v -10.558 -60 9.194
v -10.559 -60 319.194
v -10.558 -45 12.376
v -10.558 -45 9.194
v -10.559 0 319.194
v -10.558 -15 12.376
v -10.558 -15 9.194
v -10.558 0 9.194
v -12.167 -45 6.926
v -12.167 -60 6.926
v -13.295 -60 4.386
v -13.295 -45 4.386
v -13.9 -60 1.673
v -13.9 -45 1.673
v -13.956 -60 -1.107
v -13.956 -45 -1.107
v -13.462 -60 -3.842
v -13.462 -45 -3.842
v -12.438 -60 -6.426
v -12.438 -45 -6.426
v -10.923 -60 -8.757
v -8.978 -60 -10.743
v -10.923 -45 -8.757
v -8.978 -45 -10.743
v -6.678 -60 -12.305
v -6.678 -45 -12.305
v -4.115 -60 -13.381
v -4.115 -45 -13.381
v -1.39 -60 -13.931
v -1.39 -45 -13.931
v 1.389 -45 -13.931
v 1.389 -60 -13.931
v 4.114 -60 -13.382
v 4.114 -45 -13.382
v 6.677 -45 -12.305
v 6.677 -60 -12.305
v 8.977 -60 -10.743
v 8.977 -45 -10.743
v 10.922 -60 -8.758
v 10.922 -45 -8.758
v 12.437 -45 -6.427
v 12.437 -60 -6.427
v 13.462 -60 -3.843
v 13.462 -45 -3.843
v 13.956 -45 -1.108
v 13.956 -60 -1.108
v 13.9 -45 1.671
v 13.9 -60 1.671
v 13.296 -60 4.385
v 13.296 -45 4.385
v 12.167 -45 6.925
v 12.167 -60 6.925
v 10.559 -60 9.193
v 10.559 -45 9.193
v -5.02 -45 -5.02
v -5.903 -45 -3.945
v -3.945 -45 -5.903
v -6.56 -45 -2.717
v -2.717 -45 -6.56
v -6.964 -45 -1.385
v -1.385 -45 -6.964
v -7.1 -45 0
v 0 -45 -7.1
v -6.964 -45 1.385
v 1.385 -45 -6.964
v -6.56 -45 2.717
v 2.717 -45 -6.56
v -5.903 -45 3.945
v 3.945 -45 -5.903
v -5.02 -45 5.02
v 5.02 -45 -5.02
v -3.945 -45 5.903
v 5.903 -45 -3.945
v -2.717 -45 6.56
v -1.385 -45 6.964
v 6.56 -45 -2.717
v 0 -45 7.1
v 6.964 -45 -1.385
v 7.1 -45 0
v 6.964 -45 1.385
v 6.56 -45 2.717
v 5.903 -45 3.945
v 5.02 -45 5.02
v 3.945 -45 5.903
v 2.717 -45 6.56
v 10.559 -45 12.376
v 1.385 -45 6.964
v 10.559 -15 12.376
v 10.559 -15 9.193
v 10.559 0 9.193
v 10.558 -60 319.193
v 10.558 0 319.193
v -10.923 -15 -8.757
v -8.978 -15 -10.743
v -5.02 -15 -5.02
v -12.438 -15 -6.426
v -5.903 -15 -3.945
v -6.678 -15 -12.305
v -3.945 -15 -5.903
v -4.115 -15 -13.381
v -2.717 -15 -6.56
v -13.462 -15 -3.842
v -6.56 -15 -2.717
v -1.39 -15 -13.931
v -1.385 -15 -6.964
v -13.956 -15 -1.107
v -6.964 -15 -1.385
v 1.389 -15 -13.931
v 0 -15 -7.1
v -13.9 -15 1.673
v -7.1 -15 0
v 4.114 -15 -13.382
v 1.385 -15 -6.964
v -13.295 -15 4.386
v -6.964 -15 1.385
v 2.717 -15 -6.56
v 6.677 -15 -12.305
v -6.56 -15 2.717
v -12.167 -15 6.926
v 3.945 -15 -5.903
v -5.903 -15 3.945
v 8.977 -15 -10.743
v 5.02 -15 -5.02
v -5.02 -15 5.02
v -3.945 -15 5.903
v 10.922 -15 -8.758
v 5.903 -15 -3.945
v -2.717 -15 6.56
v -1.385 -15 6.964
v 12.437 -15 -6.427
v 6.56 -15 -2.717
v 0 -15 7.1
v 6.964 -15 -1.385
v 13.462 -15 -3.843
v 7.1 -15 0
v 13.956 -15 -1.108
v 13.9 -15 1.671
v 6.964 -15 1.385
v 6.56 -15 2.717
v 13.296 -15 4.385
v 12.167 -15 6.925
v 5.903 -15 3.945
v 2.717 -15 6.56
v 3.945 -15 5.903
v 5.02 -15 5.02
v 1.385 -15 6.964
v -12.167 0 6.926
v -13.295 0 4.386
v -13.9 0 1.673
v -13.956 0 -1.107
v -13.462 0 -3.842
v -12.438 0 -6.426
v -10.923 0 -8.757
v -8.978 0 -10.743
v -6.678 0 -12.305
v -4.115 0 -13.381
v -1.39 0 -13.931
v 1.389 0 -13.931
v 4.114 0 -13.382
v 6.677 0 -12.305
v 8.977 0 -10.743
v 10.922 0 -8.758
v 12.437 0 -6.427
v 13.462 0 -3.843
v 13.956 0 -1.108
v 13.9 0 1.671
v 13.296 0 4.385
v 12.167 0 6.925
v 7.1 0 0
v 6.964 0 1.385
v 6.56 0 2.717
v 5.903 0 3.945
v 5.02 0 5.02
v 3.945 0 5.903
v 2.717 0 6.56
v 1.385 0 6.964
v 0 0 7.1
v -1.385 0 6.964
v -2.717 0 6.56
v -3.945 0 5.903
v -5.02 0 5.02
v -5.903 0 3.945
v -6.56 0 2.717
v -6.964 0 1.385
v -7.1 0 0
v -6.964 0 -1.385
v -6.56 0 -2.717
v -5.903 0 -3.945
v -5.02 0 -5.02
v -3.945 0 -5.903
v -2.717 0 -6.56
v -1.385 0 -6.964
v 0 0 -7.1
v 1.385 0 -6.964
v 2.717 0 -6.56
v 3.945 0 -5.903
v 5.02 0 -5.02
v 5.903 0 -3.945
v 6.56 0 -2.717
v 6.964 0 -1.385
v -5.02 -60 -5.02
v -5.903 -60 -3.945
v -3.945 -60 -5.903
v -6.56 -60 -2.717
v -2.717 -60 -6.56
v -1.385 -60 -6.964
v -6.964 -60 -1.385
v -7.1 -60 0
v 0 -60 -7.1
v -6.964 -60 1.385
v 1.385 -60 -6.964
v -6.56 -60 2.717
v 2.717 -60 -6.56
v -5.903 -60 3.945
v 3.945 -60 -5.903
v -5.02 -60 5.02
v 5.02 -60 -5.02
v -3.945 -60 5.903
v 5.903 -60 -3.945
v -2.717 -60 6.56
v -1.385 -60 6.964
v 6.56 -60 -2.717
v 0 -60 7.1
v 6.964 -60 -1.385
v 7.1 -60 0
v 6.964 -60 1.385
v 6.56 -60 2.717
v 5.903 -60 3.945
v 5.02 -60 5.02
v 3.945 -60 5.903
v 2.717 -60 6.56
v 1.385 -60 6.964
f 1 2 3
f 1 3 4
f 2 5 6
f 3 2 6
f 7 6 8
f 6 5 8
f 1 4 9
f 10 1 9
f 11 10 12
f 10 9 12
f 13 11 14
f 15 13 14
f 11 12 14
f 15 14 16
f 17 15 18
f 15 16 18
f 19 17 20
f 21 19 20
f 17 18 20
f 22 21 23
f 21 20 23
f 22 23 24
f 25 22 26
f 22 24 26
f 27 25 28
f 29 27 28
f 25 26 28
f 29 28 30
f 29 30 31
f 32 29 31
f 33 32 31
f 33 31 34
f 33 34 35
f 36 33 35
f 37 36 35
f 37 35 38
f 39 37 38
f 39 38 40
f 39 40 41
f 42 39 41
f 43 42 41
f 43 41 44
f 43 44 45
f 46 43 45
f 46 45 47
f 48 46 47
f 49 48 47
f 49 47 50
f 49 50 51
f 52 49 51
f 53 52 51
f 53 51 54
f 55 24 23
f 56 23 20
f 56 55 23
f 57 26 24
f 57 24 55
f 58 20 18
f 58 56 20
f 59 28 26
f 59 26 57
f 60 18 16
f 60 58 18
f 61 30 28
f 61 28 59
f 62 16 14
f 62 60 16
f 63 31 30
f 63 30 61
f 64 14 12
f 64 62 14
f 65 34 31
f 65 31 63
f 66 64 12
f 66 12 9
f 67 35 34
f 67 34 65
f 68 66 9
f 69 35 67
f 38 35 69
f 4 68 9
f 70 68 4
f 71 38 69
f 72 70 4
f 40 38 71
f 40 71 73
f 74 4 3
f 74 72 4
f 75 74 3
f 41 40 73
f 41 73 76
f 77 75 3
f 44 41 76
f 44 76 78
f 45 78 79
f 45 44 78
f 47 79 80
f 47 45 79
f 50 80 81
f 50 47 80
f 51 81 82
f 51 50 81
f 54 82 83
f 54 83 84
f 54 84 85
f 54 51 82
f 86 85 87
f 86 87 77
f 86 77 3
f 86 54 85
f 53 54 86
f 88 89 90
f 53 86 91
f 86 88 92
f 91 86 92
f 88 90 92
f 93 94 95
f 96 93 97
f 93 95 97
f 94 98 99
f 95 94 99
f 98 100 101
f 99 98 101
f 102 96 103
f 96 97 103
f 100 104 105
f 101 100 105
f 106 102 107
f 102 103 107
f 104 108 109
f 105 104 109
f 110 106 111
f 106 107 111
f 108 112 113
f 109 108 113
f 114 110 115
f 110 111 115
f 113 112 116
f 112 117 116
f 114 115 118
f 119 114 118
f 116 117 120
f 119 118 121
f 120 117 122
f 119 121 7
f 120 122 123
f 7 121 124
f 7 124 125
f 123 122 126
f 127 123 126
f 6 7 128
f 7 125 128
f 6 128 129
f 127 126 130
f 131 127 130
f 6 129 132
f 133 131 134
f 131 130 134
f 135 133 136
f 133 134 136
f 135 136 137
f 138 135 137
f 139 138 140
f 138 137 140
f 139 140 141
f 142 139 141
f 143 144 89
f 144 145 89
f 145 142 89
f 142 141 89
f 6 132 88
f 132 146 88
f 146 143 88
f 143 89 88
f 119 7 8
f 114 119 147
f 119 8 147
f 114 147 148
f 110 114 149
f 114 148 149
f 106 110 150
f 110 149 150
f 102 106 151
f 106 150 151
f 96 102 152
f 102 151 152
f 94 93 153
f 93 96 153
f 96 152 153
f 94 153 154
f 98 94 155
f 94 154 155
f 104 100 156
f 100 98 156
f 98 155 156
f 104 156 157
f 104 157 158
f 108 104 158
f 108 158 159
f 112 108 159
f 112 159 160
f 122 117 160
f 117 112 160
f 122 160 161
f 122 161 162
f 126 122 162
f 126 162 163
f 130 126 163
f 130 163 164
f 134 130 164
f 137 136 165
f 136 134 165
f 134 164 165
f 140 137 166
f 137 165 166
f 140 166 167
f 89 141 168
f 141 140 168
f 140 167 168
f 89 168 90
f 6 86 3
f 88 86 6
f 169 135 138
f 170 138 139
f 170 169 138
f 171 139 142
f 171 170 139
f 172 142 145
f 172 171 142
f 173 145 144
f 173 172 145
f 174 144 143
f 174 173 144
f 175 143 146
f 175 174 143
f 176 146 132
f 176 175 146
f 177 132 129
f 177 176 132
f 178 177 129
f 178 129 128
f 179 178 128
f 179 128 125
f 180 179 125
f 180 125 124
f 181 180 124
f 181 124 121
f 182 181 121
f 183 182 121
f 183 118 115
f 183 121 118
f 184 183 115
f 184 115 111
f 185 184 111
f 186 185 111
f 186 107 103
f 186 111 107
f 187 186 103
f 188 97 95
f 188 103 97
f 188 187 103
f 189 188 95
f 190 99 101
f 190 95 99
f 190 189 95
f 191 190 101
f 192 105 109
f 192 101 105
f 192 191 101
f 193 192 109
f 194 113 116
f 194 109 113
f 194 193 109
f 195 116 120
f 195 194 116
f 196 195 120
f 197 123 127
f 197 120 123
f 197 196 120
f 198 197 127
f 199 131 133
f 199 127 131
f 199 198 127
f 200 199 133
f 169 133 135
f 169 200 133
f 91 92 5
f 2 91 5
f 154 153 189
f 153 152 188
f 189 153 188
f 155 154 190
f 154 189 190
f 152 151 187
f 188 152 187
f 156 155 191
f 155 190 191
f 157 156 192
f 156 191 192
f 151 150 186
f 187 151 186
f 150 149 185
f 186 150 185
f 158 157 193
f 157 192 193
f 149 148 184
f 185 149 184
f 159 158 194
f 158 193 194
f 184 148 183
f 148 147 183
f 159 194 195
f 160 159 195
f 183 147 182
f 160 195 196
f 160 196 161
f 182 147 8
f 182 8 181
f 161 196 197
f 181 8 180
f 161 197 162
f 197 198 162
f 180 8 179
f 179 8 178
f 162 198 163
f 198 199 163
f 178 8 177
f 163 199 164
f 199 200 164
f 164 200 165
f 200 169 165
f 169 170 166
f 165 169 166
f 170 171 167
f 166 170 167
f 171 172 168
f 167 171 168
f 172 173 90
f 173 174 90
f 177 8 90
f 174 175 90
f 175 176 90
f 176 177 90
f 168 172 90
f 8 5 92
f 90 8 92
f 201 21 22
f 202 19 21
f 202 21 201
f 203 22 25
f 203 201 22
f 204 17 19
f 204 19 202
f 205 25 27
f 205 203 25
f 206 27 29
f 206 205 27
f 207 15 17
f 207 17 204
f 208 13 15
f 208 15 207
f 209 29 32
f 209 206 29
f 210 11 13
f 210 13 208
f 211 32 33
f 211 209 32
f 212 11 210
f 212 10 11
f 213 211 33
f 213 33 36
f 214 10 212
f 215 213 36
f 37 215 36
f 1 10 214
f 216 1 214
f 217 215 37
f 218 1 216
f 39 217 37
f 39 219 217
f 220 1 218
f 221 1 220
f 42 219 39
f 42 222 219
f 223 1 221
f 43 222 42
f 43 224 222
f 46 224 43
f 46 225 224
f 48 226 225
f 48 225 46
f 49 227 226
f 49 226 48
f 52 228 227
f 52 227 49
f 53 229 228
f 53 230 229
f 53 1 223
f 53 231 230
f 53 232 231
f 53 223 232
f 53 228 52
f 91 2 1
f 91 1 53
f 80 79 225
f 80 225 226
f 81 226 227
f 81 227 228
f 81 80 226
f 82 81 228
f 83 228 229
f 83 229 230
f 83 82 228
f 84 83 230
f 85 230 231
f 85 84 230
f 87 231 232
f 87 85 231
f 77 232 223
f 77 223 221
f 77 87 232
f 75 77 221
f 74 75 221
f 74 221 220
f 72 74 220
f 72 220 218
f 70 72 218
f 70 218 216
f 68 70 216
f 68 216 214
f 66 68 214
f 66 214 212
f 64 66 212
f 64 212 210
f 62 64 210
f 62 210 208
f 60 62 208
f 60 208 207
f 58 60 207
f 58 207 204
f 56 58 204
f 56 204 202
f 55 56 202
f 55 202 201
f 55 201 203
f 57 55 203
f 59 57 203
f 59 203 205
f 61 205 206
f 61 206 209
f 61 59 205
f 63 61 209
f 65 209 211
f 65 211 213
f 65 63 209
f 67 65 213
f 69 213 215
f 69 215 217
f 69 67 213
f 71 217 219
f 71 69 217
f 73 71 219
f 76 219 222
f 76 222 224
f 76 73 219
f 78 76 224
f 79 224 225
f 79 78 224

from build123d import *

# Parameters (mm, degrees)
F0_R          = 7.1
F1_DEPTH      = 60
F2_W          = 30
F2_H          = 27.0439040799
F3_DEPTH      = 25
F3_DEPTH_BACK = 25


with BuildPart() as f1:
    # F0 (on Front) → F1 (new body)
    with BuildSketch(Plane.XZ):
        with BuildLine():
            Line((-10.5591211108, 319.1935136895), (-10.5583761074, 9.1935136904))
            ThreePointArc((-10.5583761074, 9.1935136904), (-0.0005672768, -13.9999999885), (10.5591211108, 9.1926580142))
            Line((10.5591211108, 9.1926580142), (10.5583761074, 319.1926580133))
            Line((10.5583761074, 319.1926580133), (-10.5591211108, 319.1935136895))
        make_face()
        Circle(F0_R, mode=Mode.SUBTRACT)
    extrude(amount=F1_DEPTH)

    # F2 (on Right) → F3 (cut, two sides)
    with BuildSketch(Plane.YZ) as f3_sk:
        with Locations((-30, -1.146184979)):
            Rectangle(F2_W, F2_H)
    extrude(amount=-F3_DEPTH, mode=Mode.SUBTRACT)
    extrude(f3_sk.sketch, amount=F3_DEPTH_BACK, mode=Mode.SUBTRACT)


solid = f1.part
